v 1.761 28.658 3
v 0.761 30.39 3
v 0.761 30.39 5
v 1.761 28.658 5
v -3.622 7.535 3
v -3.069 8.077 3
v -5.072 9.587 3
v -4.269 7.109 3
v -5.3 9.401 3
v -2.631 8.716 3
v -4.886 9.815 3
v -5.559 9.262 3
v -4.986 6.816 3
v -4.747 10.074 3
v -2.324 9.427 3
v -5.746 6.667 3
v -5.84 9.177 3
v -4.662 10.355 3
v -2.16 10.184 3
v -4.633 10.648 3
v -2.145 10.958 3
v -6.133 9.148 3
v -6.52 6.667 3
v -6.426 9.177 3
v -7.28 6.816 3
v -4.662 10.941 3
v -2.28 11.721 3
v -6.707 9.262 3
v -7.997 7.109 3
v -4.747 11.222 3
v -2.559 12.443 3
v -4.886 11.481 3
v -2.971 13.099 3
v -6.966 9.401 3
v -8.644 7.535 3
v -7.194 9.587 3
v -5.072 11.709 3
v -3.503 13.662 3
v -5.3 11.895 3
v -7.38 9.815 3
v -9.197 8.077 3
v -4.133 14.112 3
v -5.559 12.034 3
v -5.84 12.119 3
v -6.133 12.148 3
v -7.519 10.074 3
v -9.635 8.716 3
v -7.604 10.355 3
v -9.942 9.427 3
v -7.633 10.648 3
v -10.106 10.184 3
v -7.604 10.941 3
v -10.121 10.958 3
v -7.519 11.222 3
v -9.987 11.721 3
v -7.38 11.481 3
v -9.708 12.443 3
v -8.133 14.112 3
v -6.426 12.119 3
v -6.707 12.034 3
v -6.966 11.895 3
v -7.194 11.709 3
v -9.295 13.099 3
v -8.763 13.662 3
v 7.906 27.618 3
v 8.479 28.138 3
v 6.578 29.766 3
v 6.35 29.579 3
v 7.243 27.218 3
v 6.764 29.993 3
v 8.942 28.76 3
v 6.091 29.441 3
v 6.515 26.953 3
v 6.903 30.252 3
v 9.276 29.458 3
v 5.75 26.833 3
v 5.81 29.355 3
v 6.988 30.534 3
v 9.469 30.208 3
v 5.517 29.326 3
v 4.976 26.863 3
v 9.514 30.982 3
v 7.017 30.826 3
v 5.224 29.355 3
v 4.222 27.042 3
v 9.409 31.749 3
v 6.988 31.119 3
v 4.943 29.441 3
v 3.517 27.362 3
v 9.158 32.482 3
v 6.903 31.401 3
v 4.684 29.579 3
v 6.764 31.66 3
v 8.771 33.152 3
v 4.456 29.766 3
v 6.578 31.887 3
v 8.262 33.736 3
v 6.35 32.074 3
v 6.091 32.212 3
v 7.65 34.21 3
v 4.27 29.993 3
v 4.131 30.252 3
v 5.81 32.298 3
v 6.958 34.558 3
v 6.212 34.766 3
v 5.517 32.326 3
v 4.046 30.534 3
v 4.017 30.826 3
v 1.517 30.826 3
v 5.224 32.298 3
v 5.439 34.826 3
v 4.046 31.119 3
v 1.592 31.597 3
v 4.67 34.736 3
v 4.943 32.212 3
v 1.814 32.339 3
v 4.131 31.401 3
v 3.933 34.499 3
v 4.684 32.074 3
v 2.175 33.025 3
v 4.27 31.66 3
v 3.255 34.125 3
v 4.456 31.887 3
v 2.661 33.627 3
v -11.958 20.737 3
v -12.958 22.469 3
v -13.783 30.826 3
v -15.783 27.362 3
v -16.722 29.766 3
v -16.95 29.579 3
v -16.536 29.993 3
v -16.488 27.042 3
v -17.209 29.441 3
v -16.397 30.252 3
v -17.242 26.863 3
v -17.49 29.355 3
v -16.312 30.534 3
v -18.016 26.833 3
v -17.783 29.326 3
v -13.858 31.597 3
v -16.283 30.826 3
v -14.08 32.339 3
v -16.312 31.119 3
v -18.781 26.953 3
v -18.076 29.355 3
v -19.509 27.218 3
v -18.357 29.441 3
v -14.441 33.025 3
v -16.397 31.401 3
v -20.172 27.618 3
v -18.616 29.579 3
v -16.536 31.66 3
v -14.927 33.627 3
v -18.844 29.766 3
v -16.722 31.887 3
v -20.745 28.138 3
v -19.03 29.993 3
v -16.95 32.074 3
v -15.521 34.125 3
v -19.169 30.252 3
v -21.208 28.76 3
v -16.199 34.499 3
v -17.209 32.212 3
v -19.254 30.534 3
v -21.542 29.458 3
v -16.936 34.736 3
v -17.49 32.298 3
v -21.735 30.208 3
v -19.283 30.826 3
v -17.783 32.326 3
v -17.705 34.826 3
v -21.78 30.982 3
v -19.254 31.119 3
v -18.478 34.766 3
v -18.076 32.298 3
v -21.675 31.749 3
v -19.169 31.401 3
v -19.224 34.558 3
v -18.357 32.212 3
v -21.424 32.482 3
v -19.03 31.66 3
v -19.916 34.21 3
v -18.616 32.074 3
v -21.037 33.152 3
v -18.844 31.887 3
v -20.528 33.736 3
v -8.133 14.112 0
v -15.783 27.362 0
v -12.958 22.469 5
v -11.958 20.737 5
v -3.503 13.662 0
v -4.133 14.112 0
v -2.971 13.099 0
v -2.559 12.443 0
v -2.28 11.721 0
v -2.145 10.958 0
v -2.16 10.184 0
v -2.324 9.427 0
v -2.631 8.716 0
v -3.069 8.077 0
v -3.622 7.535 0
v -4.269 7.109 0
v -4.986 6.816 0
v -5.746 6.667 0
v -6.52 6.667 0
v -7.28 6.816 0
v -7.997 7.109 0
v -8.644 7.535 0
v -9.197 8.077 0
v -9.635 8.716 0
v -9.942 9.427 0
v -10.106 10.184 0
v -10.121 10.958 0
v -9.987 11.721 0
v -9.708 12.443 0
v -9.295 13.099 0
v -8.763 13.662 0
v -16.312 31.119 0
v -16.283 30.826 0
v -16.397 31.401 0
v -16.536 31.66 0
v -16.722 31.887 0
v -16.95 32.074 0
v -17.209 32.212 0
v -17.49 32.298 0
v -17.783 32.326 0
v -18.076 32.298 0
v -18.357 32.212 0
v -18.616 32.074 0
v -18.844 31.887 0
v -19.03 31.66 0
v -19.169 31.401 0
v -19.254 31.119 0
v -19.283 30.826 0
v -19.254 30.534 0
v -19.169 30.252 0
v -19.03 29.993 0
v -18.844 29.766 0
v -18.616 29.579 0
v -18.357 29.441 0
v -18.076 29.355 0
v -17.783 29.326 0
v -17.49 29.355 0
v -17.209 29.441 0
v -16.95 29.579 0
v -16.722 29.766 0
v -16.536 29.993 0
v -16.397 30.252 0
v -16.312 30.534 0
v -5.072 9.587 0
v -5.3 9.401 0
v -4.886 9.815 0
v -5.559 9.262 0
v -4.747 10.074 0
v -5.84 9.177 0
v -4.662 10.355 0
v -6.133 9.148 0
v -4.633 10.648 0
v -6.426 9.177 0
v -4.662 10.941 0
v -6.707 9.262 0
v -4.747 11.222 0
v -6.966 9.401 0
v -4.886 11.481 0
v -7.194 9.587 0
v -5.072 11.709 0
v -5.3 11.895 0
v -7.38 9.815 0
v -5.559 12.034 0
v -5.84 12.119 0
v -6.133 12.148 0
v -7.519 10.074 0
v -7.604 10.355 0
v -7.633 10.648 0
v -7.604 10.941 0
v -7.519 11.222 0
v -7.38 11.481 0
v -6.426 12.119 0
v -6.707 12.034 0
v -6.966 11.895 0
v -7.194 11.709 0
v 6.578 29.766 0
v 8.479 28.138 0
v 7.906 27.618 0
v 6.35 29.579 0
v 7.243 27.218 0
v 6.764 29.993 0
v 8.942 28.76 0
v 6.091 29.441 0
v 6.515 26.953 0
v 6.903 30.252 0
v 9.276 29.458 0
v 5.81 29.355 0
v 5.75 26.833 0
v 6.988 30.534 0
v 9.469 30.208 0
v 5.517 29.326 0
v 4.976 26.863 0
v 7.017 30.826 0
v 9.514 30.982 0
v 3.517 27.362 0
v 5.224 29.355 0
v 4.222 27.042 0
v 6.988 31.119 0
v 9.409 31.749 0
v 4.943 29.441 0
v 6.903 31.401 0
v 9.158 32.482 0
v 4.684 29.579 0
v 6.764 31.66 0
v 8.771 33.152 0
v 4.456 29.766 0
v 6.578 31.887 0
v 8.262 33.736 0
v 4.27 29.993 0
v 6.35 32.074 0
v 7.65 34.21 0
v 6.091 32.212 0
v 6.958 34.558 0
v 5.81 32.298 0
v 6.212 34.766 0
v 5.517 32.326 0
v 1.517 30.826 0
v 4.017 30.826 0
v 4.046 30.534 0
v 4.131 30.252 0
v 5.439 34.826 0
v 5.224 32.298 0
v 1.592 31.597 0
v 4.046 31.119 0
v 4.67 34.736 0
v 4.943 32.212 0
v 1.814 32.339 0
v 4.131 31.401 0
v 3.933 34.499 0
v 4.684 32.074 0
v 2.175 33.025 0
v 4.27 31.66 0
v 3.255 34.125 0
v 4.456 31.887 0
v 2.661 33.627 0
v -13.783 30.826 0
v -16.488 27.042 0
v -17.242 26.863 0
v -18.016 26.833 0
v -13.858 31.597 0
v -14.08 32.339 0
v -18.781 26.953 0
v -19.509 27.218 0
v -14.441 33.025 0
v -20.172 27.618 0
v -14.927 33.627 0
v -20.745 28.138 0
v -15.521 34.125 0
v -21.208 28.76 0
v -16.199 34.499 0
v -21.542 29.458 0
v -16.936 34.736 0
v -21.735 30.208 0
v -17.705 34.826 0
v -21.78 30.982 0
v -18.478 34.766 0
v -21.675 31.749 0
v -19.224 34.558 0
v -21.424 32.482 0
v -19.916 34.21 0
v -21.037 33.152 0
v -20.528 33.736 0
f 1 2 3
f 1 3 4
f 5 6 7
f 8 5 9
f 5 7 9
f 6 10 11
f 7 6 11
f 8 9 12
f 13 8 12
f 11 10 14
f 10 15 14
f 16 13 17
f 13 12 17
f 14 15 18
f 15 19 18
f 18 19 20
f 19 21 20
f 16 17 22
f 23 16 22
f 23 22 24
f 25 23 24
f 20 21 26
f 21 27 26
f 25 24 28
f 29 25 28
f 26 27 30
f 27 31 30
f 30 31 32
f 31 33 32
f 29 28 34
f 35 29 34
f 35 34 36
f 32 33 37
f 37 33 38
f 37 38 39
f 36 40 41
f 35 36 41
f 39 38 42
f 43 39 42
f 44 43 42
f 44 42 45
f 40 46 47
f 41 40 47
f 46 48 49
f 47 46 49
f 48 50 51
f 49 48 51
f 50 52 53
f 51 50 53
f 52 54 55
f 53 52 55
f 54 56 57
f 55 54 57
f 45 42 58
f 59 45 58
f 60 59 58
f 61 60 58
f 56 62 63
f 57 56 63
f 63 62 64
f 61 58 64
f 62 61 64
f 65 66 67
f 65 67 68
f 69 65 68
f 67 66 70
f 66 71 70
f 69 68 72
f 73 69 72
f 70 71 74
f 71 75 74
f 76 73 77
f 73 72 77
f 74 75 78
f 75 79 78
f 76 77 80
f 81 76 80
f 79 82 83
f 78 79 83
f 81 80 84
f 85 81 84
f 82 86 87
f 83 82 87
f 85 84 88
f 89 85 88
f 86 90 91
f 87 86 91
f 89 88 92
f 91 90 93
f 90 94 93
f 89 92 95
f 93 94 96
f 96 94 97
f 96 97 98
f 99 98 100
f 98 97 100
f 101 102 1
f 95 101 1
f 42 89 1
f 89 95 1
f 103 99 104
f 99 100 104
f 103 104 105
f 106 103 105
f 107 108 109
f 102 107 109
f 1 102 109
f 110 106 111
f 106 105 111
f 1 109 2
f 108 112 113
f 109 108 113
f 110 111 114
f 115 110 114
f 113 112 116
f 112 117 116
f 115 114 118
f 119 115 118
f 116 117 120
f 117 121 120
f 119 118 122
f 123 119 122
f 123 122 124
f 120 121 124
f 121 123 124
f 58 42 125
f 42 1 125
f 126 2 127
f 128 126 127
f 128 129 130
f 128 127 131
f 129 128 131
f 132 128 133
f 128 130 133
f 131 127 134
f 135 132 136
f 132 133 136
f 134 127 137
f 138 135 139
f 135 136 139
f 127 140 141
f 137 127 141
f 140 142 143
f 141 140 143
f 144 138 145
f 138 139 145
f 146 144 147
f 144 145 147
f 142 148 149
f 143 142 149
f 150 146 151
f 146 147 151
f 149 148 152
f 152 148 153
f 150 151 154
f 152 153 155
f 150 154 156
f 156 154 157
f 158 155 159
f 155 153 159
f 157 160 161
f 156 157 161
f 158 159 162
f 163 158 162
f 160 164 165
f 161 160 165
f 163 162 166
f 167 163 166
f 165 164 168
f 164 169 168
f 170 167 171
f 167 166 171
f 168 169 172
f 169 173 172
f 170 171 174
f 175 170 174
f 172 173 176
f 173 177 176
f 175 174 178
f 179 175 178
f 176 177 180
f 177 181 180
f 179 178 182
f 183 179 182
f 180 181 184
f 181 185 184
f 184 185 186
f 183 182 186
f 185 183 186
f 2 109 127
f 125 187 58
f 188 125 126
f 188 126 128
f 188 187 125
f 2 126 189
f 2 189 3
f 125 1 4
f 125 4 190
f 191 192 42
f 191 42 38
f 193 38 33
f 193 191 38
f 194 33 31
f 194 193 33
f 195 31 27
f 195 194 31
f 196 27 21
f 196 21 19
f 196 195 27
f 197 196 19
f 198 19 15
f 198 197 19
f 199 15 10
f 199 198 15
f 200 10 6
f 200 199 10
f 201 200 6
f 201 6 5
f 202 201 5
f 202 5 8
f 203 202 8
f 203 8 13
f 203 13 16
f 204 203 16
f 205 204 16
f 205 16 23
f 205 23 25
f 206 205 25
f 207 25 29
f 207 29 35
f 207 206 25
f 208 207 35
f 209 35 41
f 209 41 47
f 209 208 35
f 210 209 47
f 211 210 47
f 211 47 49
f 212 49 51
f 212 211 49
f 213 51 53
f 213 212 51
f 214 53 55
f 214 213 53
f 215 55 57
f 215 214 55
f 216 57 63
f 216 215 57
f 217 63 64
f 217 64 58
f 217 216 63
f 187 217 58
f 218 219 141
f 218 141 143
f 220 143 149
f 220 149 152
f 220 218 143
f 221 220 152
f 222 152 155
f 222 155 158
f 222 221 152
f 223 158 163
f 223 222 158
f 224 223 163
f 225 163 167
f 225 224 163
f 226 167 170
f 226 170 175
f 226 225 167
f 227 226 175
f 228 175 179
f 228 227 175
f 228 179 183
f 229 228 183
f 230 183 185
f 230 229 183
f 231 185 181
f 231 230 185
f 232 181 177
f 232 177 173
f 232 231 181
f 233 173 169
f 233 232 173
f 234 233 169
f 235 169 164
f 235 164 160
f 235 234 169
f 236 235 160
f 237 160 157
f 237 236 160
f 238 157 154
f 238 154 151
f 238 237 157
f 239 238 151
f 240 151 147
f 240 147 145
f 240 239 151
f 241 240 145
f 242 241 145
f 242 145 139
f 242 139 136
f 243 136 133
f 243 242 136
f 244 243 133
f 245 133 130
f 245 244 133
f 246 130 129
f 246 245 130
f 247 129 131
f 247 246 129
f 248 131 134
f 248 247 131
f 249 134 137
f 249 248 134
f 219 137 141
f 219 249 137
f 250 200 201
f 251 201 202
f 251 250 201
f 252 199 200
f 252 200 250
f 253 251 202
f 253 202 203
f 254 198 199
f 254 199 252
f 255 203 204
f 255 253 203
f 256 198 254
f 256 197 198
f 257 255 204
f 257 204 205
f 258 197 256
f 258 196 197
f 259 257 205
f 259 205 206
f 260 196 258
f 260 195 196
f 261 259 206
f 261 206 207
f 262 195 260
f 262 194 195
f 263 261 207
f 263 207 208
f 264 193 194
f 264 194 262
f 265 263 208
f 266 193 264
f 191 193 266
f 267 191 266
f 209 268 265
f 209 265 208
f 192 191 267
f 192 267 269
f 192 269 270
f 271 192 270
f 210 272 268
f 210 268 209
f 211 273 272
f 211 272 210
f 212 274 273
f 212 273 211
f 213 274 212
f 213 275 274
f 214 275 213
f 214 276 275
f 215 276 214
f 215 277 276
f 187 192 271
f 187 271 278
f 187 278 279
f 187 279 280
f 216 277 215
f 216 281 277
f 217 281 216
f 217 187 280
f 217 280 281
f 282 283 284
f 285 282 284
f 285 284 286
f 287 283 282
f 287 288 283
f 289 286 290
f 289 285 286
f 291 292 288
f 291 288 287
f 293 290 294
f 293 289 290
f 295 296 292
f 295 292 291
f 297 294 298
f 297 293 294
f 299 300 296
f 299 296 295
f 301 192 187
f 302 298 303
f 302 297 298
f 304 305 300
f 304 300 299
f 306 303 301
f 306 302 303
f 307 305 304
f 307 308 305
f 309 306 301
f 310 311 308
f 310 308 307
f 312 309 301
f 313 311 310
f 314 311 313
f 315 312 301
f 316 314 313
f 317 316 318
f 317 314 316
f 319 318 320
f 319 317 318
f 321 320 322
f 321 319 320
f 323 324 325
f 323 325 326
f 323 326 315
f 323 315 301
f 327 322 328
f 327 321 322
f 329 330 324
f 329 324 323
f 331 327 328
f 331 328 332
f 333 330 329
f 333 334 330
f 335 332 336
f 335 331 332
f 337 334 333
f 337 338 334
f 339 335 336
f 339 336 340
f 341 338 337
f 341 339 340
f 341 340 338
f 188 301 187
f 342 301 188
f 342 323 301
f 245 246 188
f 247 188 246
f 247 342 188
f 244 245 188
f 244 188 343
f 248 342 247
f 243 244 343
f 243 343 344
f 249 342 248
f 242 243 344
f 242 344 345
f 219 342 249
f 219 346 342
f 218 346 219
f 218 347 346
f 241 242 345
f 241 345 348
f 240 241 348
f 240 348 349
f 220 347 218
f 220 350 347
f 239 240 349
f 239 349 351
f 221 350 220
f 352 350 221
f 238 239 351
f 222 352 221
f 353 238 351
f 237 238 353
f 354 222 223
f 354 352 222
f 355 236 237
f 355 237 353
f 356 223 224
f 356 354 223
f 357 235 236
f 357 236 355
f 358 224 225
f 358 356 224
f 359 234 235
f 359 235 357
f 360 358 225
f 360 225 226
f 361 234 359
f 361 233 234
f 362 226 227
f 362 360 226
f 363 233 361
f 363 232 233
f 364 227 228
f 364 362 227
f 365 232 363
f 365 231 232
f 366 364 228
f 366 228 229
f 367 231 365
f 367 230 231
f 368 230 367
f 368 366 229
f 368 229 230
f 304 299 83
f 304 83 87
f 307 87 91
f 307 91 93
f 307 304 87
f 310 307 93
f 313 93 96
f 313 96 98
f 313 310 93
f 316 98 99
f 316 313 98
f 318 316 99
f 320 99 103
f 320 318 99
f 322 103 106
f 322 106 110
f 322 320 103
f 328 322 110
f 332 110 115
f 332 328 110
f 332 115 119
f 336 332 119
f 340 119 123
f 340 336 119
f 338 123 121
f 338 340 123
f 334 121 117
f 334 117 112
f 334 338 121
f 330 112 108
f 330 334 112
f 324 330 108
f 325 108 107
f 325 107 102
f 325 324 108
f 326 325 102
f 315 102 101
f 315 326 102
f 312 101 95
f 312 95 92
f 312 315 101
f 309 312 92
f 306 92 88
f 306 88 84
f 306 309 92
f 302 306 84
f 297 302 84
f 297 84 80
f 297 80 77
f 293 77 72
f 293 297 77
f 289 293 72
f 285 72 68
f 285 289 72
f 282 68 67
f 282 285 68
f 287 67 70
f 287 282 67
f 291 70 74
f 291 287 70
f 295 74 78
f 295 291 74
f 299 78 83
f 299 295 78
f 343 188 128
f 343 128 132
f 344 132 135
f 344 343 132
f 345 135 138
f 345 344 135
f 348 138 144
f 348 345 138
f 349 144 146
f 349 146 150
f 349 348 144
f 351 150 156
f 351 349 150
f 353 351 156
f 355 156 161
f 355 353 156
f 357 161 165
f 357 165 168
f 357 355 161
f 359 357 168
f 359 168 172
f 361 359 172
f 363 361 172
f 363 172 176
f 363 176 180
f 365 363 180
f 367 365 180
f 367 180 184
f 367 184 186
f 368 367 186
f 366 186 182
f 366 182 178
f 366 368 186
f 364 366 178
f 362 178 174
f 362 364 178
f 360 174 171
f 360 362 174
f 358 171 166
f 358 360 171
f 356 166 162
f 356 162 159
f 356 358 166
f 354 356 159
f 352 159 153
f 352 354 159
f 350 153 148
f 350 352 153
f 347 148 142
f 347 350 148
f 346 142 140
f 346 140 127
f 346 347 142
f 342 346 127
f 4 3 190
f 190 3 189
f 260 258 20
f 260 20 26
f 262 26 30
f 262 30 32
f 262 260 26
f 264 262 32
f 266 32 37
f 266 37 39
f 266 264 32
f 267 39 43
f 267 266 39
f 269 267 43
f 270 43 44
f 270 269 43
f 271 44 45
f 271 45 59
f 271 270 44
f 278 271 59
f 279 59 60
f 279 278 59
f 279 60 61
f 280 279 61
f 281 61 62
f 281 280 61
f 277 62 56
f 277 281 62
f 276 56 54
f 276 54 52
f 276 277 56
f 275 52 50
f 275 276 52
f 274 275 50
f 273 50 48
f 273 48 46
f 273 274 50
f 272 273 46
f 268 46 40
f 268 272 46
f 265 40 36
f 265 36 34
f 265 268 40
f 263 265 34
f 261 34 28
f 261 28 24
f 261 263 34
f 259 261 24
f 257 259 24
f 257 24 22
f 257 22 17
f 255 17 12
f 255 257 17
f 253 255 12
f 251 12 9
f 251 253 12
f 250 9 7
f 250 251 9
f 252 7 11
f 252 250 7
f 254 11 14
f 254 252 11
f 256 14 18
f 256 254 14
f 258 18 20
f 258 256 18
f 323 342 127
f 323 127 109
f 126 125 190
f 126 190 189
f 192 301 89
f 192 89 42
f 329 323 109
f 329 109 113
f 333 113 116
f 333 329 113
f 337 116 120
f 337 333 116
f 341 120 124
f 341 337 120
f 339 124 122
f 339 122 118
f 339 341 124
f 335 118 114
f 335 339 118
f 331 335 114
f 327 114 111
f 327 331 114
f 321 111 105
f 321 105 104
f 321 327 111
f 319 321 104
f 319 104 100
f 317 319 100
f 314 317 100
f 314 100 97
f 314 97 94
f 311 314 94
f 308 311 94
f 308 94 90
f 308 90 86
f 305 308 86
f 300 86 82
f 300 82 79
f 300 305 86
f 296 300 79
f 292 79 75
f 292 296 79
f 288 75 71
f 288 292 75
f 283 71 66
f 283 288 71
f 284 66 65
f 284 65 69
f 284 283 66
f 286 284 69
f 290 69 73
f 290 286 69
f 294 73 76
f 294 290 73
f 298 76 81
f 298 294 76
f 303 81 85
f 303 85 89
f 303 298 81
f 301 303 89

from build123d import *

# Parameters (mm, degrees)
BODY_R          = 1.5
MAIN_BODY_DEPTH = 3
FIT_DEPTH       = 2


with BuildPart() as part:
    # body → main-body (new body)
    with BuildSketch(Plane.XY):
        with BuildLine():
            Line((-13.783032013, 30.826495293), (1.516967987, 30.826495293))
            ThreePointArc((1.516967987, 30.826495293), (8.981069602, 32.826495293), (3.516967987, 27.362393677))
            Line((3.516967987, 27.362393677), (-4.133032013, 14.112205))
            ThreePointArc((-4.133032013, 14.112205), (-6.133032013, 6.648103384), (-8.133032013, 14.112205))
            Line((-8.133032013, 14.112205), (-15.783032013, 27.362393677))
            ThreePointArc((-15.783032013, 27.362393677), (-21.247133628, 32.826495293), (-13.783032013, 30.826495293))
        make_face()
        with Locations((-17.783032013, 30.826495293)):
            Circle(BODY_R, mode=Mode.SUBTRACT)
        with Locations((5.516967987, 30.826495293)):
            Circle(BODY_R, mode=Mode.SUBTRACT)
        with Locations((-6.133032013, 10.648103384)):
            Circle(BODY_R, mode=Mode.SUBTRACT)
    extrude(amount=MAIN_BODY_DEPTH)

    # Skizze3 → fit (add)
    with BuildSketch(Plane.XY.offset(3)):
        Polygon((-11.958032013, 20.737299339), (-12.958032013, 22.469350146), (0.760919419, 30.389990449), (1.760919419, 28.657939641), align=None)
    extrude(amount=FIT_DEPTH)


solid = part.part
